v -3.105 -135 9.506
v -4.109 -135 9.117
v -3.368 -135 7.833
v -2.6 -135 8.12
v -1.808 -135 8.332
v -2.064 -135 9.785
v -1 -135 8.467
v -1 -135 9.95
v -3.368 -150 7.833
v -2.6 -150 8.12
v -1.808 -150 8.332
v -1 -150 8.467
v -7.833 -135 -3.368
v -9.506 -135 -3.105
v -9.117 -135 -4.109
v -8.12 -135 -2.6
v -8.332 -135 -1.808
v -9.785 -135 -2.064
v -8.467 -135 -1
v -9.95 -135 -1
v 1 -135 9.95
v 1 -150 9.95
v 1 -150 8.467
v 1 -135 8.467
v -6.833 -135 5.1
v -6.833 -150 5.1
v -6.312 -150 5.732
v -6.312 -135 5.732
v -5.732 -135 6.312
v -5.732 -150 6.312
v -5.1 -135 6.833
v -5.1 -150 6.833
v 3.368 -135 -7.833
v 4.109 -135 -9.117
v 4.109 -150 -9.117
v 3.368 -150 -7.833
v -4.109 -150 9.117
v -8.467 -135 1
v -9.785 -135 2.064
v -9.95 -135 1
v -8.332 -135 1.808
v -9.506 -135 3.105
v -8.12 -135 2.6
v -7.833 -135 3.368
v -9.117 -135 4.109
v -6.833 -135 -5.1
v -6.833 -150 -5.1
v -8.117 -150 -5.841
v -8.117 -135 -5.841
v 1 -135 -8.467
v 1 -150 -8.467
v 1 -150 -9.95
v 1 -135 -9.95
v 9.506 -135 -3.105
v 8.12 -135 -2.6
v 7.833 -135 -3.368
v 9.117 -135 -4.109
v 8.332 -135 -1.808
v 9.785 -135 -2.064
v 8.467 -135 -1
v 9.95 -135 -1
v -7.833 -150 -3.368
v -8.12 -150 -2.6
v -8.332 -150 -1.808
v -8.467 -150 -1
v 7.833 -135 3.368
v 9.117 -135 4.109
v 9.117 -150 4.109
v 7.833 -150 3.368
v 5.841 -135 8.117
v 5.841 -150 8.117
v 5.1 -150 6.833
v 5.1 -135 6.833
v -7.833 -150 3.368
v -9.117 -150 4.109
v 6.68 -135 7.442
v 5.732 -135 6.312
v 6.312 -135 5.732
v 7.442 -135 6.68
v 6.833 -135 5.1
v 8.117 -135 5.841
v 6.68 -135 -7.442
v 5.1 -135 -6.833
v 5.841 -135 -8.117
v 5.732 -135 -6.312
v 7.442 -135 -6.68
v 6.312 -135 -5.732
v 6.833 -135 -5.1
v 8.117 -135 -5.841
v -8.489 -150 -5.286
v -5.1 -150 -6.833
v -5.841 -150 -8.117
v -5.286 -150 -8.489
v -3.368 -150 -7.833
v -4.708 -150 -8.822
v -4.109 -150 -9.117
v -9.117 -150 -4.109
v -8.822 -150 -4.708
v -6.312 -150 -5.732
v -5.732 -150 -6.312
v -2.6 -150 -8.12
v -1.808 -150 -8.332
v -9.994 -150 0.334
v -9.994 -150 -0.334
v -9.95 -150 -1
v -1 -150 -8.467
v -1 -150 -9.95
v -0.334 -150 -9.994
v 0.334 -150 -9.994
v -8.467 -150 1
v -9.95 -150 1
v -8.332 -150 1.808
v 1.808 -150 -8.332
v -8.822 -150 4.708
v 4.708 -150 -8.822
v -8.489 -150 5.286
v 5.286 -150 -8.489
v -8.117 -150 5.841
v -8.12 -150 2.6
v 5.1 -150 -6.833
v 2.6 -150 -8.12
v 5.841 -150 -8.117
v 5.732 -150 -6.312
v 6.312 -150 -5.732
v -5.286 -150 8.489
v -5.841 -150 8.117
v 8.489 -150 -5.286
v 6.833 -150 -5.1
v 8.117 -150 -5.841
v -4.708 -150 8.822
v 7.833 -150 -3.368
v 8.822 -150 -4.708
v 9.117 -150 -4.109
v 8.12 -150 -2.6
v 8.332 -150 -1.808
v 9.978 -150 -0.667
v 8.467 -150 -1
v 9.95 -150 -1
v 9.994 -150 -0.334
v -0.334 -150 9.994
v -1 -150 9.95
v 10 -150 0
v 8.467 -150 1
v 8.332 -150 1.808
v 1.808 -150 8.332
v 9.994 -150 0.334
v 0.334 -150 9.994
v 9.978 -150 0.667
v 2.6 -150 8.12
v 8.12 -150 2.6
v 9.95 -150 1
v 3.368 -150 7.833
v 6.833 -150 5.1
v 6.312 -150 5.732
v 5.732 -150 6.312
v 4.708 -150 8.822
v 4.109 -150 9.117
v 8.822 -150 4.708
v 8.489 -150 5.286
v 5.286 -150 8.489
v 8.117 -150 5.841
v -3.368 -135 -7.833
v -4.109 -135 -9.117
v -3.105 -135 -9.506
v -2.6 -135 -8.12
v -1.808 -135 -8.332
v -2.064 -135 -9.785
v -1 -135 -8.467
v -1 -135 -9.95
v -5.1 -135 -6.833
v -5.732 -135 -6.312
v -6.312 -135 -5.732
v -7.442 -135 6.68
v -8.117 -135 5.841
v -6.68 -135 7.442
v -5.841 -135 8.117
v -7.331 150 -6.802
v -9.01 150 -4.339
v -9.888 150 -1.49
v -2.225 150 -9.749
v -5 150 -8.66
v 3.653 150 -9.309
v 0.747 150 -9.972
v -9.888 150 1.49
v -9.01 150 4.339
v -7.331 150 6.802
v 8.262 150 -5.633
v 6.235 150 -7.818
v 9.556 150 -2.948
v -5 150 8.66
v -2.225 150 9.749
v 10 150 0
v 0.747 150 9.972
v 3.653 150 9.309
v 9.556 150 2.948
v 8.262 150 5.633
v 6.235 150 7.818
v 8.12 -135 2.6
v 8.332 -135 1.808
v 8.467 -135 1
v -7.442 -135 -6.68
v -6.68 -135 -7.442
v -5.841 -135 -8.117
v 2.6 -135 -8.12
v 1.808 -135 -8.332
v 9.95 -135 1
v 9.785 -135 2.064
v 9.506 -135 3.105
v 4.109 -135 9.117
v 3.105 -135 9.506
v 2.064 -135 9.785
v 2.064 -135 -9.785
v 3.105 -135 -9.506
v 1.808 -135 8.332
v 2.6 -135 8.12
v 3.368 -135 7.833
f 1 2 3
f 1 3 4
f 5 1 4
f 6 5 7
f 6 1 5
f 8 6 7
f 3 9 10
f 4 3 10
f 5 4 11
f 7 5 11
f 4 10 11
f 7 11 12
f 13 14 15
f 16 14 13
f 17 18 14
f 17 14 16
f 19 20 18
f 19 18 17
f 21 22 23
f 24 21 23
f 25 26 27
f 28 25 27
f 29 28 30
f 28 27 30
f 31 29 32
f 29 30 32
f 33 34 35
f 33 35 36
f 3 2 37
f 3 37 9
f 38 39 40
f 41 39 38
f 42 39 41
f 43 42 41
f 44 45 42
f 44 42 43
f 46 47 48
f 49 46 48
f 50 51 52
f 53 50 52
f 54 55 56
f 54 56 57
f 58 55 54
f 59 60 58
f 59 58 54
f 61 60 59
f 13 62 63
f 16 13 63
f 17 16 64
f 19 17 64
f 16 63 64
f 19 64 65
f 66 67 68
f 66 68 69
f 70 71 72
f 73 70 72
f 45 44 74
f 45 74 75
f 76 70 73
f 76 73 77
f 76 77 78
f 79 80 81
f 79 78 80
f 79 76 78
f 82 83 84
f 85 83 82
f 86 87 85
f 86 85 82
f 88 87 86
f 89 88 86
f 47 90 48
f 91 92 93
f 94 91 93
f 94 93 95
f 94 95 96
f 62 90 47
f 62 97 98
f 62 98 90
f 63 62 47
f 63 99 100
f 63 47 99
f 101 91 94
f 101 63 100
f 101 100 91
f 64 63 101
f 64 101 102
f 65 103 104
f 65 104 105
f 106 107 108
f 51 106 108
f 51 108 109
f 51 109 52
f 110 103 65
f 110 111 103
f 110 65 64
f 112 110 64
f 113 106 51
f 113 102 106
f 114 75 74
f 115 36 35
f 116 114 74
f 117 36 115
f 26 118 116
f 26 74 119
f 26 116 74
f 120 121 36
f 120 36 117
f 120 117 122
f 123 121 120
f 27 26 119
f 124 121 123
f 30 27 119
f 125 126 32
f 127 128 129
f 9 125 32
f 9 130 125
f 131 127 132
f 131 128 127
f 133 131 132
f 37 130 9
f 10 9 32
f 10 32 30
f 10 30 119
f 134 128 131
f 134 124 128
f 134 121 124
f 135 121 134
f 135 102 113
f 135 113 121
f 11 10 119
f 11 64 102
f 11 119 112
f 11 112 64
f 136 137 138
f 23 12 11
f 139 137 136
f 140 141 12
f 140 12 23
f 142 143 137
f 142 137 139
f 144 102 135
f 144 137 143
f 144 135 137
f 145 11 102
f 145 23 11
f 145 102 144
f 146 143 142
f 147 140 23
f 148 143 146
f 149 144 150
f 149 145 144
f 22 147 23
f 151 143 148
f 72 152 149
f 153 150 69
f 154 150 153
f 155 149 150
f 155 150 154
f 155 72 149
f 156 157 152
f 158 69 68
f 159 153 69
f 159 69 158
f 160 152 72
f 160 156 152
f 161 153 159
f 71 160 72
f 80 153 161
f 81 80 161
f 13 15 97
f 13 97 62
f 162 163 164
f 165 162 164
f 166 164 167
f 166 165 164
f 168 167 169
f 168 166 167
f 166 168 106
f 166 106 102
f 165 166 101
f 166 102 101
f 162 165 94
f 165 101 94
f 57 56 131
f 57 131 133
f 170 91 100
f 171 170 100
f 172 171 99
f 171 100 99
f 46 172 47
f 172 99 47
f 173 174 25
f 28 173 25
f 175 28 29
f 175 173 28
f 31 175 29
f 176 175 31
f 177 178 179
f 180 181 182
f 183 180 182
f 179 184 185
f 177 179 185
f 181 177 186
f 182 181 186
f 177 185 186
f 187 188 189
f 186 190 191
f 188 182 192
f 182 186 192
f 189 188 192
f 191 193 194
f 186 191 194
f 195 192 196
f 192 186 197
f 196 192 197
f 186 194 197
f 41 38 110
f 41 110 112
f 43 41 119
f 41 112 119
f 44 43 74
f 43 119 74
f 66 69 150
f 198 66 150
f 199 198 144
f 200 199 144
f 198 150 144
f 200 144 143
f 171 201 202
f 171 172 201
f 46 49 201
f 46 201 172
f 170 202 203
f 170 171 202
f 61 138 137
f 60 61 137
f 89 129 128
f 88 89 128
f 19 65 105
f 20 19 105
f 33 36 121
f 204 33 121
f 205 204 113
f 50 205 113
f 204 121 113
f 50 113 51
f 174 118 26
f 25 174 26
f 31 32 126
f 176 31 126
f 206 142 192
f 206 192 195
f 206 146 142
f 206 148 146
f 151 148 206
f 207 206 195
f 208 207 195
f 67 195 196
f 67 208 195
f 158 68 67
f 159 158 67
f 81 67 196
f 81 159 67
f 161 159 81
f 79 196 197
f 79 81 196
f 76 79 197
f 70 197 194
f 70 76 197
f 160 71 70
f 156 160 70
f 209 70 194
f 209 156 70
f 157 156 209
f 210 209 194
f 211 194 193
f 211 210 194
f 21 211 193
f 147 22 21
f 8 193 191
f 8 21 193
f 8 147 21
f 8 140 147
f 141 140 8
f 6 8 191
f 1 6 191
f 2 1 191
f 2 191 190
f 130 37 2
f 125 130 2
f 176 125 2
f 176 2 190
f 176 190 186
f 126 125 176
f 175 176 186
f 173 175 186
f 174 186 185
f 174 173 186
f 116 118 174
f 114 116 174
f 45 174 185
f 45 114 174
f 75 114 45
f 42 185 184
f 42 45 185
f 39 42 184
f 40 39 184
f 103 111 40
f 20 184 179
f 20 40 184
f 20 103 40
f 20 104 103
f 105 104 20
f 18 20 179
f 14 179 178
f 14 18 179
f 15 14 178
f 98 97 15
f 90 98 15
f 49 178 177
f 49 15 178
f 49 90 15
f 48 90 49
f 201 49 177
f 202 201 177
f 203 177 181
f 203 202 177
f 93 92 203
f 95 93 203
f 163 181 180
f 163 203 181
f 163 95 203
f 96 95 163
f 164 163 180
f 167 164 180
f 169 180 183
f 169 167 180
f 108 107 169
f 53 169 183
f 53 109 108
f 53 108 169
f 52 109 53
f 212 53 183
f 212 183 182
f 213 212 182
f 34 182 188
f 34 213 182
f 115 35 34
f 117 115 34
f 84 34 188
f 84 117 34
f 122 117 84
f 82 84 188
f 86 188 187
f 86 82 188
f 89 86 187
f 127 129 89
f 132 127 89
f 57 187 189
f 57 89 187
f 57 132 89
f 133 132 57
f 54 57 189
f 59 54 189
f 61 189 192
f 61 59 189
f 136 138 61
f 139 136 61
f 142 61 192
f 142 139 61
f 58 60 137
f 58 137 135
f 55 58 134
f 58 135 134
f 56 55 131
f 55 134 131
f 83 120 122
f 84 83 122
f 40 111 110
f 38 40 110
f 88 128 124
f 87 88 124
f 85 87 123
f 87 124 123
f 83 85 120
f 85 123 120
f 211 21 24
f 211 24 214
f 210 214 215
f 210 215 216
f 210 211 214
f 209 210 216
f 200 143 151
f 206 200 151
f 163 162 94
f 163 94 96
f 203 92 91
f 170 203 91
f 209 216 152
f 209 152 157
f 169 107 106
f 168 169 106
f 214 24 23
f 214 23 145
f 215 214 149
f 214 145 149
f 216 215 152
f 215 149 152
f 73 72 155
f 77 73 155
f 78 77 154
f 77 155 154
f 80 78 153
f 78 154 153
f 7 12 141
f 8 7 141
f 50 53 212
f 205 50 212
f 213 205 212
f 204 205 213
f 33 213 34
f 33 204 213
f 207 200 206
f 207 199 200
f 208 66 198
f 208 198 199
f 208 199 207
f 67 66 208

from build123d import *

# Parameters (mm, degrees)
F0_R     = 10
F1_DEPTH = 150
F3_DEPTH = 15


with BuildPart() as f1:
    # F0 (on Front) → F1 (new body, symmetric)
    with BuildSketch(Plane.XZ):
        Circle(F0_R)
    extrude(amount=F1_DEPTH, both=True)

    # F2 (on face) → F3 (cut)
    with BuildSketch(Plane.XZ.offset(150)):
        with BuildLine():
            Line((-1, 8.4674081294), (-1, 9.9498743711))
            ThreePointArc((-1, 9.9498743711), (-2.588190451, 9.6592582629), (-4.1089117817, 9.1168439698))
            Line((-4.1089117817, 9.1168439698), (-3.3676786609, 7.8329905443))
            ThreePointArc((-3.3676786609, 7.8329905443), (-2.2067568147, 8.2357285525), (-1, 8.4674081294))
        make_face()
        with BuildLine():
            Line((3.3676786609, 7.8329905443), (4.1089117817, 9.1168439698))
            ThreePointArc((4.1089117817, 9.1168439698), (2.588190451, 9.6592582629), (1, 9.9498743711))
            Line((1, 9.9498743711), (1, 8.4674081294))
            ThreePointArc((1, 8.4674081294), (2.2067568147, 8.2357285525), (3.3676786609, 7.8329905443))
        make_face()
        with BuildLine():
            Line((6.8329905443, 5.0997294685), (8.1168439698, 5.8409625893))
            ThreePointArc((8.1168439698, 5.8409625893), (7.0710678119, 7.0710678119), (5.8409625893, 8.1168439698))
            Line((5.8409625893, 8.1168439698), (5.0997294685, 6.8329905443))
            ThreePointArc((5.0997294685, 6.8329905443), (6.0289717378, 6.0289717378), (6.8329905443, 5.0997294685))
        make_face()
        with BuildLine():
            Line((8.4674081294, 1), (9.9498743711, 1))
            ThreePointArc((9.9498743711, 1), (9.6592582629, 2.588190451), (9.1168439698, 4.1089117817))
            Line((9.1168439698, 4.1089117817), (7.8329905443, 3.3676786609))
            ThreePointArc((7.8329905443, 3.3676786609), (8.2357285525, 2.2067568147), (8.4674081294, 1))
        make_face()
        with BuildLine():
            ThreePointArc((9.1168439698, -4.1089117817), (9.6592582629, -2.588190451), (9.9498743711, -1))
            Line((9.9498743711, -1), (8.4674081294, -1))
            ThreePointArc((8.4674081294, -1), (8.2357285525, -2.2067568147), (7.8329905443, -3.3676786609))
            Line((7.8329905443, -3.3676786609), (9.1168439698, -4.1089117817))
        make_face()
        with BuildLine():
            ThreePointArc((5.8409625893, -8.1168439698), (7.0710678119, -7.0710678119), (8.1168439698, -5.8409625893))
            Line((8.1168439698, -5.8409625893), (6.8329905443, -5.0997294685))
            ThreePointArc((6.8329905443, -5.0997294685), (6.0289717378, -6.0289717378), (5.0997294685, -6.8329905443))
            Line((5.0997294685, -6.8329905443), (5.8409625893, -8.1168439698))
        make_face()
        with BuildLine():
            ThreePointArc((1, -9.9498743711), (2.588190451, -9.6592582629), (4.1089117817, -9.1168439698))
            Line((4.1089117817, -9.1168439698), (3.3676786609, -7.8329905443))
            ThreePointArc((3.3676786609, -7.8329905443), (2.2067568147, -8.2357285525), (1, -8.4674081294))
            Line((1, -8.4674081294), (1, -9.9498743711))
        make_face()
        with BuildLine():
            ThreePointArc((-4.1089117817, -9.1168439698), (-2.588190451, -9.6592582629), (-1, -9.9498743711))
            Line((-1, -9.9498743711), (-1, -8.4674081294))
            ThreePointArc((-1, -8.4674081294), (-2.2067568147, -8.2357285525), (-3.3676786609, -7.8329905443))
            Line((-3.3676786609, -7.8329905443), (-4.1089117817, -9.1168439698))
        make_face()
        with BuildLine():
            ThreePointArc((-8.1168439698, -5.8409625893), (-7.0710678119, -7.0710678119), (-5.8409625893, -8.1168439698))
            Line((-5.8409625893, -8.1168439698), (-5.0997294685, -6.8329905443))
            ThreePointArc((-5.0997294685, -6.8329905443), (-6.0289717378, -6.0289717378), (-6.8329905443, -5.0997294685))
            Line((-6.8329905443, -5.0997294685), (-8.1168439698, -5.8409625893))
        make_face()
        with BuildLine():
            ThreePointArc((-9.9498743711, -1), (-9.6592582629, -2.588190451), (-9.1168439698, -4.1089117817))
            Line((-9.1168439698, -4.1089117817), (-7.8329905443, -3.3676786609))
            ThreePointArc((-7.8329905443, -3.3676786609), (-8.2357285525, -2.2067568147), (-8.4674081294, -1))
            Line((-8.4674081294, -1), (-9.9498743711, -1))
        make_face()
        with BuildLine():
            Line((-7.8329905443, 3.3676786609), (-9.1168439698, 4.1089117817))
            ThreePointArc((-9.1168439698, 4.1089117817), (-9.6592582629, 2.588190451), (-9.9498743711, 1))
            Line((-9.9498743711, 1), (-8.4674081294, 1))
            ThreePointArc((-8.4674081294, 1), (-8.2357285525, 2.2067568147), (-7.8329905443, 3.3676786609))
        make_face()
        with BuildLine():
            Line((-5.0997294685, 6.8329905443), (-5.8409625893, 8.1168439698))
            ThreePointArc((-5.8409625893, 8.1168439698), (-7.0710678119, 7.0710678119), (-8.1168439698, 5.8409625893))
            Line((-8.1168439698, 5.8409625893), (-6.8329905443, 5.0997294685))
            ThreePointArc((-6.8329905443, 5.0997294685), (-6.0289717378, 6.0289717378), (-5.0997294685, 6.8329905443))
        make_face()
    extrude(amount=-F3_DEPTH, mode=Mode.SUBTRACT)


solid = f1.part
